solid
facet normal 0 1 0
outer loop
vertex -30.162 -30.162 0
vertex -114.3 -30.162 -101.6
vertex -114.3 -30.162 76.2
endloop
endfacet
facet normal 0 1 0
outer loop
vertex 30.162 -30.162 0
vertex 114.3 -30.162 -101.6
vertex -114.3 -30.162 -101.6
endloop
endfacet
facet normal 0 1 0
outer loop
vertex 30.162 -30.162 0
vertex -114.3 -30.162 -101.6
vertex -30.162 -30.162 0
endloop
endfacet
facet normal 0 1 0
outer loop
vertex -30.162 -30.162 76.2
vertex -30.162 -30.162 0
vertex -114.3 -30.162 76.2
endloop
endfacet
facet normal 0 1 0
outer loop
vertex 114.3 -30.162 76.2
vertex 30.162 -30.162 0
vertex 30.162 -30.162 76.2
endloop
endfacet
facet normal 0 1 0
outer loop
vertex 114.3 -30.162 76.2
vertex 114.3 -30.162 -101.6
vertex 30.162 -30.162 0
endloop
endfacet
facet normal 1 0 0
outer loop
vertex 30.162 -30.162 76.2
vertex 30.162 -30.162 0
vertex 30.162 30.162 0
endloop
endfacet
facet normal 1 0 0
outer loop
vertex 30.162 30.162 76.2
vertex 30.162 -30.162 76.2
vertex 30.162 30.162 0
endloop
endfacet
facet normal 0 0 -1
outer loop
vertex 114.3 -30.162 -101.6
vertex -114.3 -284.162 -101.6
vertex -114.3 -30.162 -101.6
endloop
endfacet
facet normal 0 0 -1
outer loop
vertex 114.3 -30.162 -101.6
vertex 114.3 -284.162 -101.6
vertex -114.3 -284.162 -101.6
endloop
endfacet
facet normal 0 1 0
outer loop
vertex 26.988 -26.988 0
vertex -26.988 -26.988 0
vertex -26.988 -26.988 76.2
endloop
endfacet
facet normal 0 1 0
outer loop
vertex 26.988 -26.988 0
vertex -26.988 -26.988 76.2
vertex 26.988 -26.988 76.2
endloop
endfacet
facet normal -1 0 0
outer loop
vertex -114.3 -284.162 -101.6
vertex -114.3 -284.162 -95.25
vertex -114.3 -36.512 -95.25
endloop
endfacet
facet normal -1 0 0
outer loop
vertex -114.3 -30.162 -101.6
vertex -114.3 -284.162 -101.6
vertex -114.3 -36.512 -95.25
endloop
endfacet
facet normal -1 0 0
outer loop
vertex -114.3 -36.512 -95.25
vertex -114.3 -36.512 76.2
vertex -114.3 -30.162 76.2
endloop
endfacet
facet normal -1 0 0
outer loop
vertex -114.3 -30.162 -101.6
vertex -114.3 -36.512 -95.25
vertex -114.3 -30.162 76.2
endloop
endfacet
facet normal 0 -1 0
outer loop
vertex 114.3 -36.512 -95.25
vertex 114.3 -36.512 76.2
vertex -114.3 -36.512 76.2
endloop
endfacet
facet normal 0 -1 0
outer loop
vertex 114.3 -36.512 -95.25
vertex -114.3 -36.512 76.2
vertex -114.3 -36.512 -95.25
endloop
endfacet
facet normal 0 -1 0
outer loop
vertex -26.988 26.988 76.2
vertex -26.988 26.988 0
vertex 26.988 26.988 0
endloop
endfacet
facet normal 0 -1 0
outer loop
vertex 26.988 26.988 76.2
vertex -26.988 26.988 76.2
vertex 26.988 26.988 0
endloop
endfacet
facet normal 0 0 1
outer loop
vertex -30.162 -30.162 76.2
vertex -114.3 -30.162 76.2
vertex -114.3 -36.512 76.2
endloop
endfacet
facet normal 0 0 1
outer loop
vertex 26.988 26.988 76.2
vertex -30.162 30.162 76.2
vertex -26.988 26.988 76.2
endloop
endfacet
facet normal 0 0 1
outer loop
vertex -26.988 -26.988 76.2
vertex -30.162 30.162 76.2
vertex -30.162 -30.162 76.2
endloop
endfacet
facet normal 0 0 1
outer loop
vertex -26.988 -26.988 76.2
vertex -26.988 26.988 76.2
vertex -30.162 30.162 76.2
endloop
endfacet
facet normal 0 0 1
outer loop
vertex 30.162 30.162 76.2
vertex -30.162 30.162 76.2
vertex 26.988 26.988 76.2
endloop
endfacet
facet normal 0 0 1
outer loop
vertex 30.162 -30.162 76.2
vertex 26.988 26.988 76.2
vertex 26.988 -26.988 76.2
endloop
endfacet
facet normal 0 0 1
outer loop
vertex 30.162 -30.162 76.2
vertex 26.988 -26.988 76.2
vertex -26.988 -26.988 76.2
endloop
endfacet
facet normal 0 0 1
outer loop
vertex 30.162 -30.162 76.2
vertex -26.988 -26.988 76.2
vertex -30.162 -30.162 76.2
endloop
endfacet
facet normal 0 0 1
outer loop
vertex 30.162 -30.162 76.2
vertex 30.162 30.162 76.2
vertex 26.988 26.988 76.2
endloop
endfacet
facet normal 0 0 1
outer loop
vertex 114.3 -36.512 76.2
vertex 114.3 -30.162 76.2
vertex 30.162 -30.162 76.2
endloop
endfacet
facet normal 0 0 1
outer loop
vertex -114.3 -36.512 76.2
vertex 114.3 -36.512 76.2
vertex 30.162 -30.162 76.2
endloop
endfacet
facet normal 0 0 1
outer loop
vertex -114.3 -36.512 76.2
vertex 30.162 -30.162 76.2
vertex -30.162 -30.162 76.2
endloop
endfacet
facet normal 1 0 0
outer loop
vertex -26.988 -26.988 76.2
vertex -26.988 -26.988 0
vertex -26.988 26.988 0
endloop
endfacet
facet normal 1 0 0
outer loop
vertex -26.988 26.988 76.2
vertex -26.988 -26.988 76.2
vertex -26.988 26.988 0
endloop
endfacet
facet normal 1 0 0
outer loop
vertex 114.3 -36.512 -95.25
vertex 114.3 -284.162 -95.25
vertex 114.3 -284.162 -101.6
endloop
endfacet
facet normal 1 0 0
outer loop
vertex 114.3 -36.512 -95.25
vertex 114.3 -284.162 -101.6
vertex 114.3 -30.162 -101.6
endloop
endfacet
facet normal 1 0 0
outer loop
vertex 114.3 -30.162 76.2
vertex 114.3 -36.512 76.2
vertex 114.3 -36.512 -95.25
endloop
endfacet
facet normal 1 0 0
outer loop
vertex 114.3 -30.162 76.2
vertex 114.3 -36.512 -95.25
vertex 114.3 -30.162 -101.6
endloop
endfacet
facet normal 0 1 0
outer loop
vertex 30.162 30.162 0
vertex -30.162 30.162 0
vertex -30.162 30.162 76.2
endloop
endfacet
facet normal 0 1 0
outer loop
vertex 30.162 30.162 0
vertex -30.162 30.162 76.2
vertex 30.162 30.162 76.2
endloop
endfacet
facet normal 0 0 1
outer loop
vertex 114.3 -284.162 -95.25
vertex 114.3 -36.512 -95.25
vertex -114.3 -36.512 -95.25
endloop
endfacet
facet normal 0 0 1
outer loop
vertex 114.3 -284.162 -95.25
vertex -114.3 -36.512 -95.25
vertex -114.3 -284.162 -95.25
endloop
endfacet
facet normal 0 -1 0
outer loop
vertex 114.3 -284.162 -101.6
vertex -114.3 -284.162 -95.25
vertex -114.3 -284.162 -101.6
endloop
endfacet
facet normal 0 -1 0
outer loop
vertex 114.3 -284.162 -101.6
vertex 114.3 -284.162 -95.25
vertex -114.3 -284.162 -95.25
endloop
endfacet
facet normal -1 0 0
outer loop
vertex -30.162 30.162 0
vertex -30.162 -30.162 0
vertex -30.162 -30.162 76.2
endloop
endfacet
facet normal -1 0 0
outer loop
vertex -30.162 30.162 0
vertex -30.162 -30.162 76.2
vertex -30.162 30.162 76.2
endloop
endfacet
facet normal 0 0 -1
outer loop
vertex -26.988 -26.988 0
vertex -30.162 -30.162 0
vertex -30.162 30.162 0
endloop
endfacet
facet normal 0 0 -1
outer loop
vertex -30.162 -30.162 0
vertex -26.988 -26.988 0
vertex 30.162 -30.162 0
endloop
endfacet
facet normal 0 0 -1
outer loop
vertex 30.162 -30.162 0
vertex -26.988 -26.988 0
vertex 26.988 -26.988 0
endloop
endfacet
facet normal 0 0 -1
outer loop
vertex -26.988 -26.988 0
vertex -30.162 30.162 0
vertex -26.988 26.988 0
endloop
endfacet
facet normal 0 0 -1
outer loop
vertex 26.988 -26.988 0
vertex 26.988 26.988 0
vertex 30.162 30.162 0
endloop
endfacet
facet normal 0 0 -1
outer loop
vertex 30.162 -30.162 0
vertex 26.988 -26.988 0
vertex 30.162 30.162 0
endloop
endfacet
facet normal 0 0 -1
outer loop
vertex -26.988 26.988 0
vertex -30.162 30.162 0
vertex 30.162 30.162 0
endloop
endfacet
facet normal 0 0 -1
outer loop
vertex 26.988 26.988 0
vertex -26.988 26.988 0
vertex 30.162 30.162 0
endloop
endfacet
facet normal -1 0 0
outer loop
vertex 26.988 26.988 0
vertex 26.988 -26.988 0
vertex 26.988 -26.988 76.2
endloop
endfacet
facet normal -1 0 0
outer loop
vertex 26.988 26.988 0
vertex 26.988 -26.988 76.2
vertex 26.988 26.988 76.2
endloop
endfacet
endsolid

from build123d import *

# Parameters (mm, degrees)
F0_W     = 60.325
F0_H     = 60.325
F0_W_2   = 53.975
F0_H_2   = 53.975
F1_DEPTH = 76.2
F3_DEPTH = 114.3


with BuildPart() as f1:
    # F0 (on Top) → F1 (new body)
    with BuildSketch(Plane.XY):
        Rectangle(F0_W, F0_H)
        Rectangle(F0_W_2, F0_H_2, mode=Mode.SUBTRACT)
    extrude(amount=F1_DEPTH)

    # F2 (on Right) → F3 (join, symmetric)
    with BuildSketch(Plane.YZ):
        Polygon((-30.1625, -101.6), (-30.1625, 76.2), (-36.5125, 76.2), (-36.5125, -95.25), (-284.1625, -95.25), (-284.1625, -101.6), align=None)
    extrude(amount=F3_DEPTH, both=True)


solid = f1.part
